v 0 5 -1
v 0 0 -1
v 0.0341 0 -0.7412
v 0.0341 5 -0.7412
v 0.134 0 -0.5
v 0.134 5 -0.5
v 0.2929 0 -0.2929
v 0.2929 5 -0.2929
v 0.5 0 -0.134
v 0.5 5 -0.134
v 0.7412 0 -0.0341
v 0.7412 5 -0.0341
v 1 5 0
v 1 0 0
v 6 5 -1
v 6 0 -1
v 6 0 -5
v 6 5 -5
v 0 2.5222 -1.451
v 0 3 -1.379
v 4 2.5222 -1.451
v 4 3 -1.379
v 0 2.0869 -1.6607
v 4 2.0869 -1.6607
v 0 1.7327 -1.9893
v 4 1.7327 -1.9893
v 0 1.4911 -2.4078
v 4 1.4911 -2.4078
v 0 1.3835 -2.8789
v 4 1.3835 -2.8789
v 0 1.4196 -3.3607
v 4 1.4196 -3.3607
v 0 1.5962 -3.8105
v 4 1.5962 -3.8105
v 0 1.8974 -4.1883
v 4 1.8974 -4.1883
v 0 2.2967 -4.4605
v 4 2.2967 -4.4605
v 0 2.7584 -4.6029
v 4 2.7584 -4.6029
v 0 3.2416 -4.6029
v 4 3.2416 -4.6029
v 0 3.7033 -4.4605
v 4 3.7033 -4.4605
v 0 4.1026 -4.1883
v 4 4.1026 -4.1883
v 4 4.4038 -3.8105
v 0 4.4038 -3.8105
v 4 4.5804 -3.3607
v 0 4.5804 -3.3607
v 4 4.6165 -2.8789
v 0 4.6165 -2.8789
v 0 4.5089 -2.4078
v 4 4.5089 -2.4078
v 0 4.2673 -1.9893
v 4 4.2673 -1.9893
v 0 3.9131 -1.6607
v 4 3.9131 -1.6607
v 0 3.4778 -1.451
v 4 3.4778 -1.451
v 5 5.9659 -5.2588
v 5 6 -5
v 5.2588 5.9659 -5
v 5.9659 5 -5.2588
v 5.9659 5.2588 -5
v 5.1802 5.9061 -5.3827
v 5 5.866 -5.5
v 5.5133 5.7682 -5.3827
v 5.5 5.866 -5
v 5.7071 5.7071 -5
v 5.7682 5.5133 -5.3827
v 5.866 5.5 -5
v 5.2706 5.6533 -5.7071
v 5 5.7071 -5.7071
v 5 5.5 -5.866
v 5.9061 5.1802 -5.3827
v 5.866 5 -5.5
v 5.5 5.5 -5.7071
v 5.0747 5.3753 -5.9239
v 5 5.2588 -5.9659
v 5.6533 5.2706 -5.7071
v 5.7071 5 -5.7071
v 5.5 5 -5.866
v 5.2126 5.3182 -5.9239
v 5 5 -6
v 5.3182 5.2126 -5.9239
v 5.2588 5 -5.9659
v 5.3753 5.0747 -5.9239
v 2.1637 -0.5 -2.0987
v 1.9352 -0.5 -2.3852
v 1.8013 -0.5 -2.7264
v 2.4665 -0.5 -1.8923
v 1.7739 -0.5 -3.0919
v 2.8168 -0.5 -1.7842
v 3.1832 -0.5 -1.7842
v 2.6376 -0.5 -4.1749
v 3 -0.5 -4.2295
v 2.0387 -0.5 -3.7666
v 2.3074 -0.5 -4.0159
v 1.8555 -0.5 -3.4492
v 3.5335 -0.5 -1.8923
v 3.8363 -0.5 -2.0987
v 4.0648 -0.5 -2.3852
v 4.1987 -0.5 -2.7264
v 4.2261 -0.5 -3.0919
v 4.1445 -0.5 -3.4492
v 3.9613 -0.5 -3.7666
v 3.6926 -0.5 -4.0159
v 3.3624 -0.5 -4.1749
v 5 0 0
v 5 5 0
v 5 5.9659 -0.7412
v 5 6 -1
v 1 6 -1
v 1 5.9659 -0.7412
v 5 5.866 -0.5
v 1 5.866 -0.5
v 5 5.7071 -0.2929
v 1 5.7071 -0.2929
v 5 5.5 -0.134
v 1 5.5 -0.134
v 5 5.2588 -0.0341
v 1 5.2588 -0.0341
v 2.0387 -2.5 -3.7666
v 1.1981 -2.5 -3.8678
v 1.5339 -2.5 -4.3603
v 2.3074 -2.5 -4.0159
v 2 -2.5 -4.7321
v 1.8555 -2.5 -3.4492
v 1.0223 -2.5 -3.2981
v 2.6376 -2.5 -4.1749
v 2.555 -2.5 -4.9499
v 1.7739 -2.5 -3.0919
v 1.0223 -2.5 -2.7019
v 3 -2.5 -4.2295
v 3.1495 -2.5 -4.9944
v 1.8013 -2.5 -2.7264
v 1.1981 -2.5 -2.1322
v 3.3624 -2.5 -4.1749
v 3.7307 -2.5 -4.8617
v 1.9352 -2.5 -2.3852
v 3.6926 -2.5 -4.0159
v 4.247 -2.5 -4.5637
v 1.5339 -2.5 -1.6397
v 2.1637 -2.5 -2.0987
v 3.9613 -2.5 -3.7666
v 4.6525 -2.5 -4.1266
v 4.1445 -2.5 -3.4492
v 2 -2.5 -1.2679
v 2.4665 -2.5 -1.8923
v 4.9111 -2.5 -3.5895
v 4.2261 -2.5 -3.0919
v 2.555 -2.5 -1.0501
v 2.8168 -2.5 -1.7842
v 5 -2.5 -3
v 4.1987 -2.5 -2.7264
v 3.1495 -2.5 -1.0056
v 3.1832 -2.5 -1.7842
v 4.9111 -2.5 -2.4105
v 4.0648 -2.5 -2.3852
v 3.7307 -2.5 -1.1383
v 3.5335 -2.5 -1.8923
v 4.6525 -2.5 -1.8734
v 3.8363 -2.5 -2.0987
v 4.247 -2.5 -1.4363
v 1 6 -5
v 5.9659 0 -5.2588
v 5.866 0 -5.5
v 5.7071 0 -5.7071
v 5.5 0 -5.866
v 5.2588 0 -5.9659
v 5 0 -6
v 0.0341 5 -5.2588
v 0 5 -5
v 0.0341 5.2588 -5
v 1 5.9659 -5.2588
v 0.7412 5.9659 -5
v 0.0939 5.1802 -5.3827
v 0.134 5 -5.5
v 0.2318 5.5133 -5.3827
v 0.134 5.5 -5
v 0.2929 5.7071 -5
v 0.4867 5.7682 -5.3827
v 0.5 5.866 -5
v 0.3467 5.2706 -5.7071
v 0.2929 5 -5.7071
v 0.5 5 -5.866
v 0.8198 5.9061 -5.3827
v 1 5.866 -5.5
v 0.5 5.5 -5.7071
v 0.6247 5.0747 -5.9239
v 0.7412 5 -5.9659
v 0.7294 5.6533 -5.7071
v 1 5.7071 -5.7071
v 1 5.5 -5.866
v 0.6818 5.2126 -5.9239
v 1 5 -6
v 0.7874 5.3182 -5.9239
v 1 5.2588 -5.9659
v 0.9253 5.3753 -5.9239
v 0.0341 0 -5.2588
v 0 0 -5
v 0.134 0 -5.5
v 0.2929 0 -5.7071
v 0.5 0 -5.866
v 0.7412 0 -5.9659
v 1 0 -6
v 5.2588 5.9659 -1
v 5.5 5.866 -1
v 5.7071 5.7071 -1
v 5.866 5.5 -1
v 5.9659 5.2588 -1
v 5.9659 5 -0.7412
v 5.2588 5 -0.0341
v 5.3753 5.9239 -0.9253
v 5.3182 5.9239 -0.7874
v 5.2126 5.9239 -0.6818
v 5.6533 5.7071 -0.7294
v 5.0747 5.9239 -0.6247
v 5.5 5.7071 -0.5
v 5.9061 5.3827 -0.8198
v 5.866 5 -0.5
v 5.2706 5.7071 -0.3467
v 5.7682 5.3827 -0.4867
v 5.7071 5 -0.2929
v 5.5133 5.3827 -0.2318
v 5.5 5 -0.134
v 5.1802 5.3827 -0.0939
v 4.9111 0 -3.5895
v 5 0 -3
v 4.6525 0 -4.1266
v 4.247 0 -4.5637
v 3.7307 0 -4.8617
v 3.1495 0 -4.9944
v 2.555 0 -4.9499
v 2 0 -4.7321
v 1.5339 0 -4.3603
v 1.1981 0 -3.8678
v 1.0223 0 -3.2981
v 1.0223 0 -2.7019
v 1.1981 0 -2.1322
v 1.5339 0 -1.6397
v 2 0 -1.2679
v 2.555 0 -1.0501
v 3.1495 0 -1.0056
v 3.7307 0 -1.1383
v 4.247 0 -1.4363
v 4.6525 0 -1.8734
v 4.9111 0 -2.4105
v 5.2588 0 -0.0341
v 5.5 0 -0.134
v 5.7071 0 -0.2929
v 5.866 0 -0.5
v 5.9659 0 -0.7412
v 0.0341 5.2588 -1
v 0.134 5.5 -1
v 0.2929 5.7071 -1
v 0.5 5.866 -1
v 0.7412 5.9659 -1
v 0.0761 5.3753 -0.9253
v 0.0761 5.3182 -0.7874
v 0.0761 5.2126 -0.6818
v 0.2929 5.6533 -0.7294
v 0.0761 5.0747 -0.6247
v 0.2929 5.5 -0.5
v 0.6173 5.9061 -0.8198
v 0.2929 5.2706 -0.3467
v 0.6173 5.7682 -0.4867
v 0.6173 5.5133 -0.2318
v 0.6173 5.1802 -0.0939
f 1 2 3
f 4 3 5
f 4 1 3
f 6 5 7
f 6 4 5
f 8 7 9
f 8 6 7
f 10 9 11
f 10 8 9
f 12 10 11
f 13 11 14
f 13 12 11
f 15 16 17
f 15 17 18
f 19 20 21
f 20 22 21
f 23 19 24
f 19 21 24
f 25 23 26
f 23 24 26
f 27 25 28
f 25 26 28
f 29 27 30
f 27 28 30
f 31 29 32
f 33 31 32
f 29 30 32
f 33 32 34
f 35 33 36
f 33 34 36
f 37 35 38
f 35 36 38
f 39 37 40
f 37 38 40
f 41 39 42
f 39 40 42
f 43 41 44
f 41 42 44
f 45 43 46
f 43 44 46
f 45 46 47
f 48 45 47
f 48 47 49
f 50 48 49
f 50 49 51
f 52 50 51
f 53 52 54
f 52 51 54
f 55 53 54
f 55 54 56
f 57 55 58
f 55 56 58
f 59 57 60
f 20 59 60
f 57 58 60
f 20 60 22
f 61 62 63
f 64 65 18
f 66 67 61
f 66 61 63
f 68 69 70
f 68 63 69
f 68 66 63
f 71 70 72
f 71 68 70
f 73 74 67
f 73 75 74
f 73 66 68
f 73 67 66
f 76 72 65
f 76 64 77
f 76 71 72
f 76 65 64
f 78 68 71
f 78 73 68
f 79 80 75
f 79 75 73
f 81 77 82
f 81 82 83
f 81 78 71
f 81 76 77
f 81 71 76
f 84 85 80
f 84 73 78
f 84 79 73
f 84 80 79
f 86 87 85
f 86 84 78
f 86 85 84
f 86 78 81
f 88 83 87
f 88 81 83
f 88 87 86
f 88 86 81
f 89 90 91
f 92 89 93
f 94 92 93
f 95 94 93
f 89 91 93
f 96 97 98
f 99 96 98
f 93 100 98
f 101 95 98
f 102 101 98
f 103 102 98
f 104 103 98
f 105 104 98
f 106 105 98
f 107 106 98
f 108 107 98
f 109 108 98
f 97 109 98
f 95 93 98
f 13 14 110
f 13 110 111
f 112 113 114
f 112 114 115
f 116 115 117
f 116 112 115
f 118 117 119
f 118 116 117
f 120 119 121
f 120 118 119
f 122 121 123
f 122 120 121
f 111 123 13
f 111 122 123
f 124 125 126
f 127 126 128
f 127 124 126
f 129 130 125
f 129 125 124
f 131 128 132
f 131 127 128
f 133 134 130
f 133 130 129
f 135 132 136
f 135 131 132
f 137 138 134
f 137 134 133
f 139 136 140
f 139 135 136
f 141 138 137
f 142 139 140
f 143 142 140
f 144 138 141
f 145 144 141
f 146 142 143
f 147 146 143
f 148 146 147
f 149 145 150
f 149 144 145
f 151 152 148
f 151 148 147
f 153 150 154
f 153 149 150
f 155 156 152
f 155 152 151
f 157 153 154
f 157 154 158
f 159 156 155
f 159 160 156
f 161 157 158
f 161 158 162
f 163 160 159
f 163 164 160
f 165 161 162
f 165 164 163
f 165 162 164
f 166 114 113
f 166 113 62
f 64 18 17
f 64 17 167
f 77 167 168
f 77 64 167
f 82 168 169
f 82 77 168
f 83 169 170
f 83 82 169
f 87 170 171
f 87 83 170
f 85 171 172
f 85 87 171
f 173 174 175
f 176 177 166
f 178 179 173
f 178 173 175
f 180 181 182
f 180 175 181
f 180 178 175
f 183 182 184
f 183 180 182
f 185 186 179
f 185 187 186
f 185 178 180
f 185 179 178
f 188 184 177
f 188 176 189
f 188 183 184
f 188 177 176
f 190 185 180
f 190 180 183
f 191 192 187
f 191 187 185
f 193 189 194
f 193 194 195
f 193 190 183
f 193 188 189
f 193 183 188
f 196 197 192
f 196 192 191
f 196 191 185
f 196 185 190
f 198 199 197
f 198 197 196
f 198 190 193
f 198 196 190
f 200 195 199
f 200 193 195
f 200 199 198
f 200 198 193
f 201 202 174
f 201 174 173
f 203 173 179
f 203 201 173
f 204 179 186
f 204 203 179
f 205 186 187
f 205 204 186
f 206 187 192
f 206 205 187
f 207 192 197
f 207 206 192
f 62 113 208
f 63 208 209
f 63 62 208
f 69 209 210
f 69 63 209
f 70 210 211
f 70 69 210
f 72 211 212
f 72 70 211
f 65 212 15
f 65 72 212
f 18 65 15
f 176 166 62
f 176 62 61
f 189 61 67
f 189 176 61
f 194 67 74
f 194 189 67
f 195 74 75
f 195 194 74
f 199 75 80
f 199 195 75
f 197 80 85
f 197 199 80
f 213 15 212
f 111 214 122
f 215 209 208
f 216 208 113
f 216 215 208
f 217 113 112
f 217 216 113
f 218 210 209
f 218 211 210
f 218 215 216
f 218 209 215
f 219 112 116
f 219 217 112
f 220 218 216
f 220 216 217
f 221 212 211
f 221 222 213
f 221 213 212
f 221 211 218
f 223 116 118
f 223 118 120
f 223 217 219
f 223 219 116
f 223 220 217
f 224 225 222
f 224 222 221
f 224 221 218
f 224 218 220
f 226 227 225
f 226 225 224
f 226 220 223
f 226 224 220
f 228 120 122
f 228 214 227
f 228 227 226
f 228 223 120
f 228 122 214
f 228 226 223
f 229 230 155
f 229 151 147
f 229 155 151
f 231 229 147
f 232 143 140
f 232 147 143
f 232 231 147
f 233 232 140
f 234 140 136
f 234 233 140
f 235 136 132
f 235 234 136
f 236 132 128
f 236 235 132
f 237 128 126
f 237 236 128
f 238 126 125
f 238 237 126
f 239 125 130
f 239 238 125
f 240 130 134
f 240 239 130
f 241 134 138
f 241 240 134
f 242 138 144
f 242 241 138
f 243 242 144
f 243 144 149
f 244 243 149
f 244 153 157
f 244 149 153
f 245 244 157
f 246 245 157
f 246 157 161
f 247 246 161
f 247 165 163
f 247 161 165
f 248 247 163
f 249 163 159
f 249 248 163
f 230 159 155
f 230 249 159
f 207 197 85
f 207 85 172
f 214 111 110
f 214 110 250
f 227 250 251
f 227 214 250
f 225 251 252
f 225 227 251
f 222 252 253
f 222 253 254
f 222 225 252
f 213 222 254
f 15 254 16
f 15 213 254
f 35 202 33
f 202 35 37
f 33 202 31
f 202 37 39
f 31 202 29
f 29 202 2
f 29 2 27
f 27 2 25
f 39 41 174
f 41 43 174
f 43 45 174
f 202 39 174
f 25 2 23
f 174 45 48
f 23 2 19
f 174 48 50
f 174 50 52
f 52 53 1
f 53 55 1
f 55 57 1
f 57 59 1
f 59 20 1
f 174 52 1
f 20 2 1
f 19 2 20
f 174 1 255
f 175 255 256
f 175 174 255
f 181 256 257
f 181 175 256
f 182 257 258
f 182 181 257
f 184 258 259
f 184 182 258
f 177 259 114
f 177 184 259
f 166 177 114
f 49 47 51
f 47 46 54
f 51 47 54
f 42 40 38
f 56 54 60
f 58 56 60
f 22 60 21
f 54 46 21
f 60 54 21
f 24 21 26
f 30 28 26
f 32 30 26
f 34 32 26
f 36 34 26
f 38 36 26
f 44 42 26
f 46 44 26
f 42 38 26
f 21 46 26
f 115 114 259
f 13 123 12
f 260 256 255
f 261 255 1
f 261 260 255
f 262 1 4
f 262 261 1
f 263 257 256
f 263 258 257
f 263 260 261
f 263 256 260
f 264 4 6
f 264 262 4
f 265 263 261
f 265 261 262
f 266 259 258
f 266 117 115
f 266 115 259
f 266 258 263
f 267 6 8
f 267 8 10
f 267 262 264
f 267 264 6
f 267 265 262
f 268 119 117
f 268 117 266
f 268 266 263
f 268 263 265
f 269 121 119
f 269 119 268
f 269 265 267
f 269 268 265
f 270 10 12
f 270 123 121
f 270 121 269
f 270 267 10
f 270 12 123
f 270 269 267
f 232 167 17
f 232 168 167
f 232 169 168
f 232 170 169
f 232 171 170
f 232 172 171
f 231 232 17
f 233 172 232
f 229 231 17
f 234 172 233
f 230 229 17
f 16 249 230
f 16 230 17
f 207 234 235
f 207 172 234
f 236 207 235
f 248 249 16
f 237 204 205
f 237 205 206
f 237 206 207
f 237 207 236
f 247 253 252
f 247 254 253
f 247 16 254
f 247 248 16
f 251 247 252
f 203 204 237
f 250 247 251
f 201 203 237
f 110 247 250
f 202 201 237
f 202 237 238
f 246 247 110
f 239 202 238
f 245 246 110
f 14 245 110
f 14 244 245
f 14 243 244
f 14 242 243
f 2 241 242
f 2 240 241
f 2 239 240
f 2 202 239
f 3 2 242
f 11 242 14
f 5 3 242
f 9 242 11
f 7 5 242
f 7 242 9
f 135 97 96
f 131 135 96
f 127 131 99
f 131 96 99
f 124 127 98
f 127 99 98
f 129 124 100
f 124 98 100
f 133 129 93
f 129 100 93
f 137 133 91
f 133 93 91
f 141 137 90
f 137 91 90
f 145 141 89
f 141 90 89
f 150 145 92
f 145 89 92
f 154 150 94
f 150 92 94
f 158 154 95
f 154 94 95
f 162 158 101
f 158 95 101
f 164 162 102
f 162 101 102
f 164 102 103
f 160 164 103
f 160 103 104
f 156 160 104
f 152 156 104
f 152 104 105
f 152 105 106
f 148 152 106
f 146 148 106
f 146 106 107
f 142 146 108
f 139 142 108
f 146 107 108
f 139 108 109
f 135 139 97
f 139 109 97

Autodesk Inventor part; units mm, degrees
ref_plane "YZ Plane" through (0, 0, 0) normal (1, 0, 0) x (0, 1, 0)
ref_plane "XZ Plane" through (0, 0, 0) normal (0, 1, 0) x (-1, 0, 0)
ref_plane "XY Plane" through (0, 0, 0) normal (0, 0, 1) x (1, 0, 0)
sketch "Esboço1" plane through (0, 0, 0) normal (1, 0, 0) x (0, 1, 0)
  line L0 (0, 0) -> (6, 0)
  line L1 (6, 0) -> (6, -6)
  line L2 (6, -6) -> (0, -6)
  line L3 (0, -6) -> (0, 0)
  dimension "d0" = 6
  dimension "d1" = 6
extrude "Extrusão1" add sketch "Esboço1" along normal blind 6
sketch "Esboço2" plane through (0, 0, 0) normal (0, 0, 1) x (1, 0, 0)
  point P0 (0, 0)
sketch "Esboço3" plane through (6, 0, 0) normal (1, 0, 0) x (0, 0, -1)
  line L0 (0, 6) -> (0, 0) projected
  line L1 (6, 0) -> (6, 6) projected
sketch "Esboço4" plane through (0, 0, -6) normal (0, -1, 0) x (1, 0, 0)
  line L0 (0, 0) -> (0, 6) projected
  line L1 (6, 0) -> (6, 6) projected
  circle A0 centre (3, 3) radius 2
  dimension "d5" = 4
extrude "Extrusão2" add sketch "Esboço4" along normal blind 2.5
sketch "Esboço6" plane through (0, 0, 0) normal (-1, 0, 0) x (0, 0, 1)
  line L0 (-6, 6) -> (0, 6) projected
  line L1 (0, 0) -> (-6, 0) projected
  point P0 (-3, 3)
hole "Furo2" at (0, 3, -3) direction (1, 0, 0) diameter 3.242 depth 4 thread size "M4x0.7" class "6H" standard "ANSI Metric M Profile"
fillet "Arredondamento1" radius 1 1 edges at (6, 3, 0)
fillet "Arredondamento2" radius 1 3 edges at (6, 6, -3.5) (5.7071, 6, -0.2929) (2.5, 6, 0)
fillet "Arredondamento3" radius 1 3 edges at (0, 6, -3.5) (0, 5.7071, -0.2929) (0, 2.5, 0)
fillet "Arredondamento4" radius 1 5 edges at (0, 2.5, -6) (0.2929, 5.7071, -6) (3, 6, -6) (5.7071, 5.7071, -6) (6, 2.5, -6)
sketch "Esboço7" plane through (3, -2.5, -3) normal (0, -1, 0) x (1, 0, 0)
  point P0 (-3, 3)
sketch "Esboço8" plane through (3, -2.5, -3) normal (0, -1, 0) x (1, 0, 0)
  point P0 (-3, 3)
  point P1 (0, 0)
hole "Furo3" at (3, -2.5, -3) direction (0, 1, 0) diameter 2.459 depth 2 thread size "M3x0.5" class "6H" standard "ANSI Metric M Profile"
properties part number "CONECTOR R-F"
